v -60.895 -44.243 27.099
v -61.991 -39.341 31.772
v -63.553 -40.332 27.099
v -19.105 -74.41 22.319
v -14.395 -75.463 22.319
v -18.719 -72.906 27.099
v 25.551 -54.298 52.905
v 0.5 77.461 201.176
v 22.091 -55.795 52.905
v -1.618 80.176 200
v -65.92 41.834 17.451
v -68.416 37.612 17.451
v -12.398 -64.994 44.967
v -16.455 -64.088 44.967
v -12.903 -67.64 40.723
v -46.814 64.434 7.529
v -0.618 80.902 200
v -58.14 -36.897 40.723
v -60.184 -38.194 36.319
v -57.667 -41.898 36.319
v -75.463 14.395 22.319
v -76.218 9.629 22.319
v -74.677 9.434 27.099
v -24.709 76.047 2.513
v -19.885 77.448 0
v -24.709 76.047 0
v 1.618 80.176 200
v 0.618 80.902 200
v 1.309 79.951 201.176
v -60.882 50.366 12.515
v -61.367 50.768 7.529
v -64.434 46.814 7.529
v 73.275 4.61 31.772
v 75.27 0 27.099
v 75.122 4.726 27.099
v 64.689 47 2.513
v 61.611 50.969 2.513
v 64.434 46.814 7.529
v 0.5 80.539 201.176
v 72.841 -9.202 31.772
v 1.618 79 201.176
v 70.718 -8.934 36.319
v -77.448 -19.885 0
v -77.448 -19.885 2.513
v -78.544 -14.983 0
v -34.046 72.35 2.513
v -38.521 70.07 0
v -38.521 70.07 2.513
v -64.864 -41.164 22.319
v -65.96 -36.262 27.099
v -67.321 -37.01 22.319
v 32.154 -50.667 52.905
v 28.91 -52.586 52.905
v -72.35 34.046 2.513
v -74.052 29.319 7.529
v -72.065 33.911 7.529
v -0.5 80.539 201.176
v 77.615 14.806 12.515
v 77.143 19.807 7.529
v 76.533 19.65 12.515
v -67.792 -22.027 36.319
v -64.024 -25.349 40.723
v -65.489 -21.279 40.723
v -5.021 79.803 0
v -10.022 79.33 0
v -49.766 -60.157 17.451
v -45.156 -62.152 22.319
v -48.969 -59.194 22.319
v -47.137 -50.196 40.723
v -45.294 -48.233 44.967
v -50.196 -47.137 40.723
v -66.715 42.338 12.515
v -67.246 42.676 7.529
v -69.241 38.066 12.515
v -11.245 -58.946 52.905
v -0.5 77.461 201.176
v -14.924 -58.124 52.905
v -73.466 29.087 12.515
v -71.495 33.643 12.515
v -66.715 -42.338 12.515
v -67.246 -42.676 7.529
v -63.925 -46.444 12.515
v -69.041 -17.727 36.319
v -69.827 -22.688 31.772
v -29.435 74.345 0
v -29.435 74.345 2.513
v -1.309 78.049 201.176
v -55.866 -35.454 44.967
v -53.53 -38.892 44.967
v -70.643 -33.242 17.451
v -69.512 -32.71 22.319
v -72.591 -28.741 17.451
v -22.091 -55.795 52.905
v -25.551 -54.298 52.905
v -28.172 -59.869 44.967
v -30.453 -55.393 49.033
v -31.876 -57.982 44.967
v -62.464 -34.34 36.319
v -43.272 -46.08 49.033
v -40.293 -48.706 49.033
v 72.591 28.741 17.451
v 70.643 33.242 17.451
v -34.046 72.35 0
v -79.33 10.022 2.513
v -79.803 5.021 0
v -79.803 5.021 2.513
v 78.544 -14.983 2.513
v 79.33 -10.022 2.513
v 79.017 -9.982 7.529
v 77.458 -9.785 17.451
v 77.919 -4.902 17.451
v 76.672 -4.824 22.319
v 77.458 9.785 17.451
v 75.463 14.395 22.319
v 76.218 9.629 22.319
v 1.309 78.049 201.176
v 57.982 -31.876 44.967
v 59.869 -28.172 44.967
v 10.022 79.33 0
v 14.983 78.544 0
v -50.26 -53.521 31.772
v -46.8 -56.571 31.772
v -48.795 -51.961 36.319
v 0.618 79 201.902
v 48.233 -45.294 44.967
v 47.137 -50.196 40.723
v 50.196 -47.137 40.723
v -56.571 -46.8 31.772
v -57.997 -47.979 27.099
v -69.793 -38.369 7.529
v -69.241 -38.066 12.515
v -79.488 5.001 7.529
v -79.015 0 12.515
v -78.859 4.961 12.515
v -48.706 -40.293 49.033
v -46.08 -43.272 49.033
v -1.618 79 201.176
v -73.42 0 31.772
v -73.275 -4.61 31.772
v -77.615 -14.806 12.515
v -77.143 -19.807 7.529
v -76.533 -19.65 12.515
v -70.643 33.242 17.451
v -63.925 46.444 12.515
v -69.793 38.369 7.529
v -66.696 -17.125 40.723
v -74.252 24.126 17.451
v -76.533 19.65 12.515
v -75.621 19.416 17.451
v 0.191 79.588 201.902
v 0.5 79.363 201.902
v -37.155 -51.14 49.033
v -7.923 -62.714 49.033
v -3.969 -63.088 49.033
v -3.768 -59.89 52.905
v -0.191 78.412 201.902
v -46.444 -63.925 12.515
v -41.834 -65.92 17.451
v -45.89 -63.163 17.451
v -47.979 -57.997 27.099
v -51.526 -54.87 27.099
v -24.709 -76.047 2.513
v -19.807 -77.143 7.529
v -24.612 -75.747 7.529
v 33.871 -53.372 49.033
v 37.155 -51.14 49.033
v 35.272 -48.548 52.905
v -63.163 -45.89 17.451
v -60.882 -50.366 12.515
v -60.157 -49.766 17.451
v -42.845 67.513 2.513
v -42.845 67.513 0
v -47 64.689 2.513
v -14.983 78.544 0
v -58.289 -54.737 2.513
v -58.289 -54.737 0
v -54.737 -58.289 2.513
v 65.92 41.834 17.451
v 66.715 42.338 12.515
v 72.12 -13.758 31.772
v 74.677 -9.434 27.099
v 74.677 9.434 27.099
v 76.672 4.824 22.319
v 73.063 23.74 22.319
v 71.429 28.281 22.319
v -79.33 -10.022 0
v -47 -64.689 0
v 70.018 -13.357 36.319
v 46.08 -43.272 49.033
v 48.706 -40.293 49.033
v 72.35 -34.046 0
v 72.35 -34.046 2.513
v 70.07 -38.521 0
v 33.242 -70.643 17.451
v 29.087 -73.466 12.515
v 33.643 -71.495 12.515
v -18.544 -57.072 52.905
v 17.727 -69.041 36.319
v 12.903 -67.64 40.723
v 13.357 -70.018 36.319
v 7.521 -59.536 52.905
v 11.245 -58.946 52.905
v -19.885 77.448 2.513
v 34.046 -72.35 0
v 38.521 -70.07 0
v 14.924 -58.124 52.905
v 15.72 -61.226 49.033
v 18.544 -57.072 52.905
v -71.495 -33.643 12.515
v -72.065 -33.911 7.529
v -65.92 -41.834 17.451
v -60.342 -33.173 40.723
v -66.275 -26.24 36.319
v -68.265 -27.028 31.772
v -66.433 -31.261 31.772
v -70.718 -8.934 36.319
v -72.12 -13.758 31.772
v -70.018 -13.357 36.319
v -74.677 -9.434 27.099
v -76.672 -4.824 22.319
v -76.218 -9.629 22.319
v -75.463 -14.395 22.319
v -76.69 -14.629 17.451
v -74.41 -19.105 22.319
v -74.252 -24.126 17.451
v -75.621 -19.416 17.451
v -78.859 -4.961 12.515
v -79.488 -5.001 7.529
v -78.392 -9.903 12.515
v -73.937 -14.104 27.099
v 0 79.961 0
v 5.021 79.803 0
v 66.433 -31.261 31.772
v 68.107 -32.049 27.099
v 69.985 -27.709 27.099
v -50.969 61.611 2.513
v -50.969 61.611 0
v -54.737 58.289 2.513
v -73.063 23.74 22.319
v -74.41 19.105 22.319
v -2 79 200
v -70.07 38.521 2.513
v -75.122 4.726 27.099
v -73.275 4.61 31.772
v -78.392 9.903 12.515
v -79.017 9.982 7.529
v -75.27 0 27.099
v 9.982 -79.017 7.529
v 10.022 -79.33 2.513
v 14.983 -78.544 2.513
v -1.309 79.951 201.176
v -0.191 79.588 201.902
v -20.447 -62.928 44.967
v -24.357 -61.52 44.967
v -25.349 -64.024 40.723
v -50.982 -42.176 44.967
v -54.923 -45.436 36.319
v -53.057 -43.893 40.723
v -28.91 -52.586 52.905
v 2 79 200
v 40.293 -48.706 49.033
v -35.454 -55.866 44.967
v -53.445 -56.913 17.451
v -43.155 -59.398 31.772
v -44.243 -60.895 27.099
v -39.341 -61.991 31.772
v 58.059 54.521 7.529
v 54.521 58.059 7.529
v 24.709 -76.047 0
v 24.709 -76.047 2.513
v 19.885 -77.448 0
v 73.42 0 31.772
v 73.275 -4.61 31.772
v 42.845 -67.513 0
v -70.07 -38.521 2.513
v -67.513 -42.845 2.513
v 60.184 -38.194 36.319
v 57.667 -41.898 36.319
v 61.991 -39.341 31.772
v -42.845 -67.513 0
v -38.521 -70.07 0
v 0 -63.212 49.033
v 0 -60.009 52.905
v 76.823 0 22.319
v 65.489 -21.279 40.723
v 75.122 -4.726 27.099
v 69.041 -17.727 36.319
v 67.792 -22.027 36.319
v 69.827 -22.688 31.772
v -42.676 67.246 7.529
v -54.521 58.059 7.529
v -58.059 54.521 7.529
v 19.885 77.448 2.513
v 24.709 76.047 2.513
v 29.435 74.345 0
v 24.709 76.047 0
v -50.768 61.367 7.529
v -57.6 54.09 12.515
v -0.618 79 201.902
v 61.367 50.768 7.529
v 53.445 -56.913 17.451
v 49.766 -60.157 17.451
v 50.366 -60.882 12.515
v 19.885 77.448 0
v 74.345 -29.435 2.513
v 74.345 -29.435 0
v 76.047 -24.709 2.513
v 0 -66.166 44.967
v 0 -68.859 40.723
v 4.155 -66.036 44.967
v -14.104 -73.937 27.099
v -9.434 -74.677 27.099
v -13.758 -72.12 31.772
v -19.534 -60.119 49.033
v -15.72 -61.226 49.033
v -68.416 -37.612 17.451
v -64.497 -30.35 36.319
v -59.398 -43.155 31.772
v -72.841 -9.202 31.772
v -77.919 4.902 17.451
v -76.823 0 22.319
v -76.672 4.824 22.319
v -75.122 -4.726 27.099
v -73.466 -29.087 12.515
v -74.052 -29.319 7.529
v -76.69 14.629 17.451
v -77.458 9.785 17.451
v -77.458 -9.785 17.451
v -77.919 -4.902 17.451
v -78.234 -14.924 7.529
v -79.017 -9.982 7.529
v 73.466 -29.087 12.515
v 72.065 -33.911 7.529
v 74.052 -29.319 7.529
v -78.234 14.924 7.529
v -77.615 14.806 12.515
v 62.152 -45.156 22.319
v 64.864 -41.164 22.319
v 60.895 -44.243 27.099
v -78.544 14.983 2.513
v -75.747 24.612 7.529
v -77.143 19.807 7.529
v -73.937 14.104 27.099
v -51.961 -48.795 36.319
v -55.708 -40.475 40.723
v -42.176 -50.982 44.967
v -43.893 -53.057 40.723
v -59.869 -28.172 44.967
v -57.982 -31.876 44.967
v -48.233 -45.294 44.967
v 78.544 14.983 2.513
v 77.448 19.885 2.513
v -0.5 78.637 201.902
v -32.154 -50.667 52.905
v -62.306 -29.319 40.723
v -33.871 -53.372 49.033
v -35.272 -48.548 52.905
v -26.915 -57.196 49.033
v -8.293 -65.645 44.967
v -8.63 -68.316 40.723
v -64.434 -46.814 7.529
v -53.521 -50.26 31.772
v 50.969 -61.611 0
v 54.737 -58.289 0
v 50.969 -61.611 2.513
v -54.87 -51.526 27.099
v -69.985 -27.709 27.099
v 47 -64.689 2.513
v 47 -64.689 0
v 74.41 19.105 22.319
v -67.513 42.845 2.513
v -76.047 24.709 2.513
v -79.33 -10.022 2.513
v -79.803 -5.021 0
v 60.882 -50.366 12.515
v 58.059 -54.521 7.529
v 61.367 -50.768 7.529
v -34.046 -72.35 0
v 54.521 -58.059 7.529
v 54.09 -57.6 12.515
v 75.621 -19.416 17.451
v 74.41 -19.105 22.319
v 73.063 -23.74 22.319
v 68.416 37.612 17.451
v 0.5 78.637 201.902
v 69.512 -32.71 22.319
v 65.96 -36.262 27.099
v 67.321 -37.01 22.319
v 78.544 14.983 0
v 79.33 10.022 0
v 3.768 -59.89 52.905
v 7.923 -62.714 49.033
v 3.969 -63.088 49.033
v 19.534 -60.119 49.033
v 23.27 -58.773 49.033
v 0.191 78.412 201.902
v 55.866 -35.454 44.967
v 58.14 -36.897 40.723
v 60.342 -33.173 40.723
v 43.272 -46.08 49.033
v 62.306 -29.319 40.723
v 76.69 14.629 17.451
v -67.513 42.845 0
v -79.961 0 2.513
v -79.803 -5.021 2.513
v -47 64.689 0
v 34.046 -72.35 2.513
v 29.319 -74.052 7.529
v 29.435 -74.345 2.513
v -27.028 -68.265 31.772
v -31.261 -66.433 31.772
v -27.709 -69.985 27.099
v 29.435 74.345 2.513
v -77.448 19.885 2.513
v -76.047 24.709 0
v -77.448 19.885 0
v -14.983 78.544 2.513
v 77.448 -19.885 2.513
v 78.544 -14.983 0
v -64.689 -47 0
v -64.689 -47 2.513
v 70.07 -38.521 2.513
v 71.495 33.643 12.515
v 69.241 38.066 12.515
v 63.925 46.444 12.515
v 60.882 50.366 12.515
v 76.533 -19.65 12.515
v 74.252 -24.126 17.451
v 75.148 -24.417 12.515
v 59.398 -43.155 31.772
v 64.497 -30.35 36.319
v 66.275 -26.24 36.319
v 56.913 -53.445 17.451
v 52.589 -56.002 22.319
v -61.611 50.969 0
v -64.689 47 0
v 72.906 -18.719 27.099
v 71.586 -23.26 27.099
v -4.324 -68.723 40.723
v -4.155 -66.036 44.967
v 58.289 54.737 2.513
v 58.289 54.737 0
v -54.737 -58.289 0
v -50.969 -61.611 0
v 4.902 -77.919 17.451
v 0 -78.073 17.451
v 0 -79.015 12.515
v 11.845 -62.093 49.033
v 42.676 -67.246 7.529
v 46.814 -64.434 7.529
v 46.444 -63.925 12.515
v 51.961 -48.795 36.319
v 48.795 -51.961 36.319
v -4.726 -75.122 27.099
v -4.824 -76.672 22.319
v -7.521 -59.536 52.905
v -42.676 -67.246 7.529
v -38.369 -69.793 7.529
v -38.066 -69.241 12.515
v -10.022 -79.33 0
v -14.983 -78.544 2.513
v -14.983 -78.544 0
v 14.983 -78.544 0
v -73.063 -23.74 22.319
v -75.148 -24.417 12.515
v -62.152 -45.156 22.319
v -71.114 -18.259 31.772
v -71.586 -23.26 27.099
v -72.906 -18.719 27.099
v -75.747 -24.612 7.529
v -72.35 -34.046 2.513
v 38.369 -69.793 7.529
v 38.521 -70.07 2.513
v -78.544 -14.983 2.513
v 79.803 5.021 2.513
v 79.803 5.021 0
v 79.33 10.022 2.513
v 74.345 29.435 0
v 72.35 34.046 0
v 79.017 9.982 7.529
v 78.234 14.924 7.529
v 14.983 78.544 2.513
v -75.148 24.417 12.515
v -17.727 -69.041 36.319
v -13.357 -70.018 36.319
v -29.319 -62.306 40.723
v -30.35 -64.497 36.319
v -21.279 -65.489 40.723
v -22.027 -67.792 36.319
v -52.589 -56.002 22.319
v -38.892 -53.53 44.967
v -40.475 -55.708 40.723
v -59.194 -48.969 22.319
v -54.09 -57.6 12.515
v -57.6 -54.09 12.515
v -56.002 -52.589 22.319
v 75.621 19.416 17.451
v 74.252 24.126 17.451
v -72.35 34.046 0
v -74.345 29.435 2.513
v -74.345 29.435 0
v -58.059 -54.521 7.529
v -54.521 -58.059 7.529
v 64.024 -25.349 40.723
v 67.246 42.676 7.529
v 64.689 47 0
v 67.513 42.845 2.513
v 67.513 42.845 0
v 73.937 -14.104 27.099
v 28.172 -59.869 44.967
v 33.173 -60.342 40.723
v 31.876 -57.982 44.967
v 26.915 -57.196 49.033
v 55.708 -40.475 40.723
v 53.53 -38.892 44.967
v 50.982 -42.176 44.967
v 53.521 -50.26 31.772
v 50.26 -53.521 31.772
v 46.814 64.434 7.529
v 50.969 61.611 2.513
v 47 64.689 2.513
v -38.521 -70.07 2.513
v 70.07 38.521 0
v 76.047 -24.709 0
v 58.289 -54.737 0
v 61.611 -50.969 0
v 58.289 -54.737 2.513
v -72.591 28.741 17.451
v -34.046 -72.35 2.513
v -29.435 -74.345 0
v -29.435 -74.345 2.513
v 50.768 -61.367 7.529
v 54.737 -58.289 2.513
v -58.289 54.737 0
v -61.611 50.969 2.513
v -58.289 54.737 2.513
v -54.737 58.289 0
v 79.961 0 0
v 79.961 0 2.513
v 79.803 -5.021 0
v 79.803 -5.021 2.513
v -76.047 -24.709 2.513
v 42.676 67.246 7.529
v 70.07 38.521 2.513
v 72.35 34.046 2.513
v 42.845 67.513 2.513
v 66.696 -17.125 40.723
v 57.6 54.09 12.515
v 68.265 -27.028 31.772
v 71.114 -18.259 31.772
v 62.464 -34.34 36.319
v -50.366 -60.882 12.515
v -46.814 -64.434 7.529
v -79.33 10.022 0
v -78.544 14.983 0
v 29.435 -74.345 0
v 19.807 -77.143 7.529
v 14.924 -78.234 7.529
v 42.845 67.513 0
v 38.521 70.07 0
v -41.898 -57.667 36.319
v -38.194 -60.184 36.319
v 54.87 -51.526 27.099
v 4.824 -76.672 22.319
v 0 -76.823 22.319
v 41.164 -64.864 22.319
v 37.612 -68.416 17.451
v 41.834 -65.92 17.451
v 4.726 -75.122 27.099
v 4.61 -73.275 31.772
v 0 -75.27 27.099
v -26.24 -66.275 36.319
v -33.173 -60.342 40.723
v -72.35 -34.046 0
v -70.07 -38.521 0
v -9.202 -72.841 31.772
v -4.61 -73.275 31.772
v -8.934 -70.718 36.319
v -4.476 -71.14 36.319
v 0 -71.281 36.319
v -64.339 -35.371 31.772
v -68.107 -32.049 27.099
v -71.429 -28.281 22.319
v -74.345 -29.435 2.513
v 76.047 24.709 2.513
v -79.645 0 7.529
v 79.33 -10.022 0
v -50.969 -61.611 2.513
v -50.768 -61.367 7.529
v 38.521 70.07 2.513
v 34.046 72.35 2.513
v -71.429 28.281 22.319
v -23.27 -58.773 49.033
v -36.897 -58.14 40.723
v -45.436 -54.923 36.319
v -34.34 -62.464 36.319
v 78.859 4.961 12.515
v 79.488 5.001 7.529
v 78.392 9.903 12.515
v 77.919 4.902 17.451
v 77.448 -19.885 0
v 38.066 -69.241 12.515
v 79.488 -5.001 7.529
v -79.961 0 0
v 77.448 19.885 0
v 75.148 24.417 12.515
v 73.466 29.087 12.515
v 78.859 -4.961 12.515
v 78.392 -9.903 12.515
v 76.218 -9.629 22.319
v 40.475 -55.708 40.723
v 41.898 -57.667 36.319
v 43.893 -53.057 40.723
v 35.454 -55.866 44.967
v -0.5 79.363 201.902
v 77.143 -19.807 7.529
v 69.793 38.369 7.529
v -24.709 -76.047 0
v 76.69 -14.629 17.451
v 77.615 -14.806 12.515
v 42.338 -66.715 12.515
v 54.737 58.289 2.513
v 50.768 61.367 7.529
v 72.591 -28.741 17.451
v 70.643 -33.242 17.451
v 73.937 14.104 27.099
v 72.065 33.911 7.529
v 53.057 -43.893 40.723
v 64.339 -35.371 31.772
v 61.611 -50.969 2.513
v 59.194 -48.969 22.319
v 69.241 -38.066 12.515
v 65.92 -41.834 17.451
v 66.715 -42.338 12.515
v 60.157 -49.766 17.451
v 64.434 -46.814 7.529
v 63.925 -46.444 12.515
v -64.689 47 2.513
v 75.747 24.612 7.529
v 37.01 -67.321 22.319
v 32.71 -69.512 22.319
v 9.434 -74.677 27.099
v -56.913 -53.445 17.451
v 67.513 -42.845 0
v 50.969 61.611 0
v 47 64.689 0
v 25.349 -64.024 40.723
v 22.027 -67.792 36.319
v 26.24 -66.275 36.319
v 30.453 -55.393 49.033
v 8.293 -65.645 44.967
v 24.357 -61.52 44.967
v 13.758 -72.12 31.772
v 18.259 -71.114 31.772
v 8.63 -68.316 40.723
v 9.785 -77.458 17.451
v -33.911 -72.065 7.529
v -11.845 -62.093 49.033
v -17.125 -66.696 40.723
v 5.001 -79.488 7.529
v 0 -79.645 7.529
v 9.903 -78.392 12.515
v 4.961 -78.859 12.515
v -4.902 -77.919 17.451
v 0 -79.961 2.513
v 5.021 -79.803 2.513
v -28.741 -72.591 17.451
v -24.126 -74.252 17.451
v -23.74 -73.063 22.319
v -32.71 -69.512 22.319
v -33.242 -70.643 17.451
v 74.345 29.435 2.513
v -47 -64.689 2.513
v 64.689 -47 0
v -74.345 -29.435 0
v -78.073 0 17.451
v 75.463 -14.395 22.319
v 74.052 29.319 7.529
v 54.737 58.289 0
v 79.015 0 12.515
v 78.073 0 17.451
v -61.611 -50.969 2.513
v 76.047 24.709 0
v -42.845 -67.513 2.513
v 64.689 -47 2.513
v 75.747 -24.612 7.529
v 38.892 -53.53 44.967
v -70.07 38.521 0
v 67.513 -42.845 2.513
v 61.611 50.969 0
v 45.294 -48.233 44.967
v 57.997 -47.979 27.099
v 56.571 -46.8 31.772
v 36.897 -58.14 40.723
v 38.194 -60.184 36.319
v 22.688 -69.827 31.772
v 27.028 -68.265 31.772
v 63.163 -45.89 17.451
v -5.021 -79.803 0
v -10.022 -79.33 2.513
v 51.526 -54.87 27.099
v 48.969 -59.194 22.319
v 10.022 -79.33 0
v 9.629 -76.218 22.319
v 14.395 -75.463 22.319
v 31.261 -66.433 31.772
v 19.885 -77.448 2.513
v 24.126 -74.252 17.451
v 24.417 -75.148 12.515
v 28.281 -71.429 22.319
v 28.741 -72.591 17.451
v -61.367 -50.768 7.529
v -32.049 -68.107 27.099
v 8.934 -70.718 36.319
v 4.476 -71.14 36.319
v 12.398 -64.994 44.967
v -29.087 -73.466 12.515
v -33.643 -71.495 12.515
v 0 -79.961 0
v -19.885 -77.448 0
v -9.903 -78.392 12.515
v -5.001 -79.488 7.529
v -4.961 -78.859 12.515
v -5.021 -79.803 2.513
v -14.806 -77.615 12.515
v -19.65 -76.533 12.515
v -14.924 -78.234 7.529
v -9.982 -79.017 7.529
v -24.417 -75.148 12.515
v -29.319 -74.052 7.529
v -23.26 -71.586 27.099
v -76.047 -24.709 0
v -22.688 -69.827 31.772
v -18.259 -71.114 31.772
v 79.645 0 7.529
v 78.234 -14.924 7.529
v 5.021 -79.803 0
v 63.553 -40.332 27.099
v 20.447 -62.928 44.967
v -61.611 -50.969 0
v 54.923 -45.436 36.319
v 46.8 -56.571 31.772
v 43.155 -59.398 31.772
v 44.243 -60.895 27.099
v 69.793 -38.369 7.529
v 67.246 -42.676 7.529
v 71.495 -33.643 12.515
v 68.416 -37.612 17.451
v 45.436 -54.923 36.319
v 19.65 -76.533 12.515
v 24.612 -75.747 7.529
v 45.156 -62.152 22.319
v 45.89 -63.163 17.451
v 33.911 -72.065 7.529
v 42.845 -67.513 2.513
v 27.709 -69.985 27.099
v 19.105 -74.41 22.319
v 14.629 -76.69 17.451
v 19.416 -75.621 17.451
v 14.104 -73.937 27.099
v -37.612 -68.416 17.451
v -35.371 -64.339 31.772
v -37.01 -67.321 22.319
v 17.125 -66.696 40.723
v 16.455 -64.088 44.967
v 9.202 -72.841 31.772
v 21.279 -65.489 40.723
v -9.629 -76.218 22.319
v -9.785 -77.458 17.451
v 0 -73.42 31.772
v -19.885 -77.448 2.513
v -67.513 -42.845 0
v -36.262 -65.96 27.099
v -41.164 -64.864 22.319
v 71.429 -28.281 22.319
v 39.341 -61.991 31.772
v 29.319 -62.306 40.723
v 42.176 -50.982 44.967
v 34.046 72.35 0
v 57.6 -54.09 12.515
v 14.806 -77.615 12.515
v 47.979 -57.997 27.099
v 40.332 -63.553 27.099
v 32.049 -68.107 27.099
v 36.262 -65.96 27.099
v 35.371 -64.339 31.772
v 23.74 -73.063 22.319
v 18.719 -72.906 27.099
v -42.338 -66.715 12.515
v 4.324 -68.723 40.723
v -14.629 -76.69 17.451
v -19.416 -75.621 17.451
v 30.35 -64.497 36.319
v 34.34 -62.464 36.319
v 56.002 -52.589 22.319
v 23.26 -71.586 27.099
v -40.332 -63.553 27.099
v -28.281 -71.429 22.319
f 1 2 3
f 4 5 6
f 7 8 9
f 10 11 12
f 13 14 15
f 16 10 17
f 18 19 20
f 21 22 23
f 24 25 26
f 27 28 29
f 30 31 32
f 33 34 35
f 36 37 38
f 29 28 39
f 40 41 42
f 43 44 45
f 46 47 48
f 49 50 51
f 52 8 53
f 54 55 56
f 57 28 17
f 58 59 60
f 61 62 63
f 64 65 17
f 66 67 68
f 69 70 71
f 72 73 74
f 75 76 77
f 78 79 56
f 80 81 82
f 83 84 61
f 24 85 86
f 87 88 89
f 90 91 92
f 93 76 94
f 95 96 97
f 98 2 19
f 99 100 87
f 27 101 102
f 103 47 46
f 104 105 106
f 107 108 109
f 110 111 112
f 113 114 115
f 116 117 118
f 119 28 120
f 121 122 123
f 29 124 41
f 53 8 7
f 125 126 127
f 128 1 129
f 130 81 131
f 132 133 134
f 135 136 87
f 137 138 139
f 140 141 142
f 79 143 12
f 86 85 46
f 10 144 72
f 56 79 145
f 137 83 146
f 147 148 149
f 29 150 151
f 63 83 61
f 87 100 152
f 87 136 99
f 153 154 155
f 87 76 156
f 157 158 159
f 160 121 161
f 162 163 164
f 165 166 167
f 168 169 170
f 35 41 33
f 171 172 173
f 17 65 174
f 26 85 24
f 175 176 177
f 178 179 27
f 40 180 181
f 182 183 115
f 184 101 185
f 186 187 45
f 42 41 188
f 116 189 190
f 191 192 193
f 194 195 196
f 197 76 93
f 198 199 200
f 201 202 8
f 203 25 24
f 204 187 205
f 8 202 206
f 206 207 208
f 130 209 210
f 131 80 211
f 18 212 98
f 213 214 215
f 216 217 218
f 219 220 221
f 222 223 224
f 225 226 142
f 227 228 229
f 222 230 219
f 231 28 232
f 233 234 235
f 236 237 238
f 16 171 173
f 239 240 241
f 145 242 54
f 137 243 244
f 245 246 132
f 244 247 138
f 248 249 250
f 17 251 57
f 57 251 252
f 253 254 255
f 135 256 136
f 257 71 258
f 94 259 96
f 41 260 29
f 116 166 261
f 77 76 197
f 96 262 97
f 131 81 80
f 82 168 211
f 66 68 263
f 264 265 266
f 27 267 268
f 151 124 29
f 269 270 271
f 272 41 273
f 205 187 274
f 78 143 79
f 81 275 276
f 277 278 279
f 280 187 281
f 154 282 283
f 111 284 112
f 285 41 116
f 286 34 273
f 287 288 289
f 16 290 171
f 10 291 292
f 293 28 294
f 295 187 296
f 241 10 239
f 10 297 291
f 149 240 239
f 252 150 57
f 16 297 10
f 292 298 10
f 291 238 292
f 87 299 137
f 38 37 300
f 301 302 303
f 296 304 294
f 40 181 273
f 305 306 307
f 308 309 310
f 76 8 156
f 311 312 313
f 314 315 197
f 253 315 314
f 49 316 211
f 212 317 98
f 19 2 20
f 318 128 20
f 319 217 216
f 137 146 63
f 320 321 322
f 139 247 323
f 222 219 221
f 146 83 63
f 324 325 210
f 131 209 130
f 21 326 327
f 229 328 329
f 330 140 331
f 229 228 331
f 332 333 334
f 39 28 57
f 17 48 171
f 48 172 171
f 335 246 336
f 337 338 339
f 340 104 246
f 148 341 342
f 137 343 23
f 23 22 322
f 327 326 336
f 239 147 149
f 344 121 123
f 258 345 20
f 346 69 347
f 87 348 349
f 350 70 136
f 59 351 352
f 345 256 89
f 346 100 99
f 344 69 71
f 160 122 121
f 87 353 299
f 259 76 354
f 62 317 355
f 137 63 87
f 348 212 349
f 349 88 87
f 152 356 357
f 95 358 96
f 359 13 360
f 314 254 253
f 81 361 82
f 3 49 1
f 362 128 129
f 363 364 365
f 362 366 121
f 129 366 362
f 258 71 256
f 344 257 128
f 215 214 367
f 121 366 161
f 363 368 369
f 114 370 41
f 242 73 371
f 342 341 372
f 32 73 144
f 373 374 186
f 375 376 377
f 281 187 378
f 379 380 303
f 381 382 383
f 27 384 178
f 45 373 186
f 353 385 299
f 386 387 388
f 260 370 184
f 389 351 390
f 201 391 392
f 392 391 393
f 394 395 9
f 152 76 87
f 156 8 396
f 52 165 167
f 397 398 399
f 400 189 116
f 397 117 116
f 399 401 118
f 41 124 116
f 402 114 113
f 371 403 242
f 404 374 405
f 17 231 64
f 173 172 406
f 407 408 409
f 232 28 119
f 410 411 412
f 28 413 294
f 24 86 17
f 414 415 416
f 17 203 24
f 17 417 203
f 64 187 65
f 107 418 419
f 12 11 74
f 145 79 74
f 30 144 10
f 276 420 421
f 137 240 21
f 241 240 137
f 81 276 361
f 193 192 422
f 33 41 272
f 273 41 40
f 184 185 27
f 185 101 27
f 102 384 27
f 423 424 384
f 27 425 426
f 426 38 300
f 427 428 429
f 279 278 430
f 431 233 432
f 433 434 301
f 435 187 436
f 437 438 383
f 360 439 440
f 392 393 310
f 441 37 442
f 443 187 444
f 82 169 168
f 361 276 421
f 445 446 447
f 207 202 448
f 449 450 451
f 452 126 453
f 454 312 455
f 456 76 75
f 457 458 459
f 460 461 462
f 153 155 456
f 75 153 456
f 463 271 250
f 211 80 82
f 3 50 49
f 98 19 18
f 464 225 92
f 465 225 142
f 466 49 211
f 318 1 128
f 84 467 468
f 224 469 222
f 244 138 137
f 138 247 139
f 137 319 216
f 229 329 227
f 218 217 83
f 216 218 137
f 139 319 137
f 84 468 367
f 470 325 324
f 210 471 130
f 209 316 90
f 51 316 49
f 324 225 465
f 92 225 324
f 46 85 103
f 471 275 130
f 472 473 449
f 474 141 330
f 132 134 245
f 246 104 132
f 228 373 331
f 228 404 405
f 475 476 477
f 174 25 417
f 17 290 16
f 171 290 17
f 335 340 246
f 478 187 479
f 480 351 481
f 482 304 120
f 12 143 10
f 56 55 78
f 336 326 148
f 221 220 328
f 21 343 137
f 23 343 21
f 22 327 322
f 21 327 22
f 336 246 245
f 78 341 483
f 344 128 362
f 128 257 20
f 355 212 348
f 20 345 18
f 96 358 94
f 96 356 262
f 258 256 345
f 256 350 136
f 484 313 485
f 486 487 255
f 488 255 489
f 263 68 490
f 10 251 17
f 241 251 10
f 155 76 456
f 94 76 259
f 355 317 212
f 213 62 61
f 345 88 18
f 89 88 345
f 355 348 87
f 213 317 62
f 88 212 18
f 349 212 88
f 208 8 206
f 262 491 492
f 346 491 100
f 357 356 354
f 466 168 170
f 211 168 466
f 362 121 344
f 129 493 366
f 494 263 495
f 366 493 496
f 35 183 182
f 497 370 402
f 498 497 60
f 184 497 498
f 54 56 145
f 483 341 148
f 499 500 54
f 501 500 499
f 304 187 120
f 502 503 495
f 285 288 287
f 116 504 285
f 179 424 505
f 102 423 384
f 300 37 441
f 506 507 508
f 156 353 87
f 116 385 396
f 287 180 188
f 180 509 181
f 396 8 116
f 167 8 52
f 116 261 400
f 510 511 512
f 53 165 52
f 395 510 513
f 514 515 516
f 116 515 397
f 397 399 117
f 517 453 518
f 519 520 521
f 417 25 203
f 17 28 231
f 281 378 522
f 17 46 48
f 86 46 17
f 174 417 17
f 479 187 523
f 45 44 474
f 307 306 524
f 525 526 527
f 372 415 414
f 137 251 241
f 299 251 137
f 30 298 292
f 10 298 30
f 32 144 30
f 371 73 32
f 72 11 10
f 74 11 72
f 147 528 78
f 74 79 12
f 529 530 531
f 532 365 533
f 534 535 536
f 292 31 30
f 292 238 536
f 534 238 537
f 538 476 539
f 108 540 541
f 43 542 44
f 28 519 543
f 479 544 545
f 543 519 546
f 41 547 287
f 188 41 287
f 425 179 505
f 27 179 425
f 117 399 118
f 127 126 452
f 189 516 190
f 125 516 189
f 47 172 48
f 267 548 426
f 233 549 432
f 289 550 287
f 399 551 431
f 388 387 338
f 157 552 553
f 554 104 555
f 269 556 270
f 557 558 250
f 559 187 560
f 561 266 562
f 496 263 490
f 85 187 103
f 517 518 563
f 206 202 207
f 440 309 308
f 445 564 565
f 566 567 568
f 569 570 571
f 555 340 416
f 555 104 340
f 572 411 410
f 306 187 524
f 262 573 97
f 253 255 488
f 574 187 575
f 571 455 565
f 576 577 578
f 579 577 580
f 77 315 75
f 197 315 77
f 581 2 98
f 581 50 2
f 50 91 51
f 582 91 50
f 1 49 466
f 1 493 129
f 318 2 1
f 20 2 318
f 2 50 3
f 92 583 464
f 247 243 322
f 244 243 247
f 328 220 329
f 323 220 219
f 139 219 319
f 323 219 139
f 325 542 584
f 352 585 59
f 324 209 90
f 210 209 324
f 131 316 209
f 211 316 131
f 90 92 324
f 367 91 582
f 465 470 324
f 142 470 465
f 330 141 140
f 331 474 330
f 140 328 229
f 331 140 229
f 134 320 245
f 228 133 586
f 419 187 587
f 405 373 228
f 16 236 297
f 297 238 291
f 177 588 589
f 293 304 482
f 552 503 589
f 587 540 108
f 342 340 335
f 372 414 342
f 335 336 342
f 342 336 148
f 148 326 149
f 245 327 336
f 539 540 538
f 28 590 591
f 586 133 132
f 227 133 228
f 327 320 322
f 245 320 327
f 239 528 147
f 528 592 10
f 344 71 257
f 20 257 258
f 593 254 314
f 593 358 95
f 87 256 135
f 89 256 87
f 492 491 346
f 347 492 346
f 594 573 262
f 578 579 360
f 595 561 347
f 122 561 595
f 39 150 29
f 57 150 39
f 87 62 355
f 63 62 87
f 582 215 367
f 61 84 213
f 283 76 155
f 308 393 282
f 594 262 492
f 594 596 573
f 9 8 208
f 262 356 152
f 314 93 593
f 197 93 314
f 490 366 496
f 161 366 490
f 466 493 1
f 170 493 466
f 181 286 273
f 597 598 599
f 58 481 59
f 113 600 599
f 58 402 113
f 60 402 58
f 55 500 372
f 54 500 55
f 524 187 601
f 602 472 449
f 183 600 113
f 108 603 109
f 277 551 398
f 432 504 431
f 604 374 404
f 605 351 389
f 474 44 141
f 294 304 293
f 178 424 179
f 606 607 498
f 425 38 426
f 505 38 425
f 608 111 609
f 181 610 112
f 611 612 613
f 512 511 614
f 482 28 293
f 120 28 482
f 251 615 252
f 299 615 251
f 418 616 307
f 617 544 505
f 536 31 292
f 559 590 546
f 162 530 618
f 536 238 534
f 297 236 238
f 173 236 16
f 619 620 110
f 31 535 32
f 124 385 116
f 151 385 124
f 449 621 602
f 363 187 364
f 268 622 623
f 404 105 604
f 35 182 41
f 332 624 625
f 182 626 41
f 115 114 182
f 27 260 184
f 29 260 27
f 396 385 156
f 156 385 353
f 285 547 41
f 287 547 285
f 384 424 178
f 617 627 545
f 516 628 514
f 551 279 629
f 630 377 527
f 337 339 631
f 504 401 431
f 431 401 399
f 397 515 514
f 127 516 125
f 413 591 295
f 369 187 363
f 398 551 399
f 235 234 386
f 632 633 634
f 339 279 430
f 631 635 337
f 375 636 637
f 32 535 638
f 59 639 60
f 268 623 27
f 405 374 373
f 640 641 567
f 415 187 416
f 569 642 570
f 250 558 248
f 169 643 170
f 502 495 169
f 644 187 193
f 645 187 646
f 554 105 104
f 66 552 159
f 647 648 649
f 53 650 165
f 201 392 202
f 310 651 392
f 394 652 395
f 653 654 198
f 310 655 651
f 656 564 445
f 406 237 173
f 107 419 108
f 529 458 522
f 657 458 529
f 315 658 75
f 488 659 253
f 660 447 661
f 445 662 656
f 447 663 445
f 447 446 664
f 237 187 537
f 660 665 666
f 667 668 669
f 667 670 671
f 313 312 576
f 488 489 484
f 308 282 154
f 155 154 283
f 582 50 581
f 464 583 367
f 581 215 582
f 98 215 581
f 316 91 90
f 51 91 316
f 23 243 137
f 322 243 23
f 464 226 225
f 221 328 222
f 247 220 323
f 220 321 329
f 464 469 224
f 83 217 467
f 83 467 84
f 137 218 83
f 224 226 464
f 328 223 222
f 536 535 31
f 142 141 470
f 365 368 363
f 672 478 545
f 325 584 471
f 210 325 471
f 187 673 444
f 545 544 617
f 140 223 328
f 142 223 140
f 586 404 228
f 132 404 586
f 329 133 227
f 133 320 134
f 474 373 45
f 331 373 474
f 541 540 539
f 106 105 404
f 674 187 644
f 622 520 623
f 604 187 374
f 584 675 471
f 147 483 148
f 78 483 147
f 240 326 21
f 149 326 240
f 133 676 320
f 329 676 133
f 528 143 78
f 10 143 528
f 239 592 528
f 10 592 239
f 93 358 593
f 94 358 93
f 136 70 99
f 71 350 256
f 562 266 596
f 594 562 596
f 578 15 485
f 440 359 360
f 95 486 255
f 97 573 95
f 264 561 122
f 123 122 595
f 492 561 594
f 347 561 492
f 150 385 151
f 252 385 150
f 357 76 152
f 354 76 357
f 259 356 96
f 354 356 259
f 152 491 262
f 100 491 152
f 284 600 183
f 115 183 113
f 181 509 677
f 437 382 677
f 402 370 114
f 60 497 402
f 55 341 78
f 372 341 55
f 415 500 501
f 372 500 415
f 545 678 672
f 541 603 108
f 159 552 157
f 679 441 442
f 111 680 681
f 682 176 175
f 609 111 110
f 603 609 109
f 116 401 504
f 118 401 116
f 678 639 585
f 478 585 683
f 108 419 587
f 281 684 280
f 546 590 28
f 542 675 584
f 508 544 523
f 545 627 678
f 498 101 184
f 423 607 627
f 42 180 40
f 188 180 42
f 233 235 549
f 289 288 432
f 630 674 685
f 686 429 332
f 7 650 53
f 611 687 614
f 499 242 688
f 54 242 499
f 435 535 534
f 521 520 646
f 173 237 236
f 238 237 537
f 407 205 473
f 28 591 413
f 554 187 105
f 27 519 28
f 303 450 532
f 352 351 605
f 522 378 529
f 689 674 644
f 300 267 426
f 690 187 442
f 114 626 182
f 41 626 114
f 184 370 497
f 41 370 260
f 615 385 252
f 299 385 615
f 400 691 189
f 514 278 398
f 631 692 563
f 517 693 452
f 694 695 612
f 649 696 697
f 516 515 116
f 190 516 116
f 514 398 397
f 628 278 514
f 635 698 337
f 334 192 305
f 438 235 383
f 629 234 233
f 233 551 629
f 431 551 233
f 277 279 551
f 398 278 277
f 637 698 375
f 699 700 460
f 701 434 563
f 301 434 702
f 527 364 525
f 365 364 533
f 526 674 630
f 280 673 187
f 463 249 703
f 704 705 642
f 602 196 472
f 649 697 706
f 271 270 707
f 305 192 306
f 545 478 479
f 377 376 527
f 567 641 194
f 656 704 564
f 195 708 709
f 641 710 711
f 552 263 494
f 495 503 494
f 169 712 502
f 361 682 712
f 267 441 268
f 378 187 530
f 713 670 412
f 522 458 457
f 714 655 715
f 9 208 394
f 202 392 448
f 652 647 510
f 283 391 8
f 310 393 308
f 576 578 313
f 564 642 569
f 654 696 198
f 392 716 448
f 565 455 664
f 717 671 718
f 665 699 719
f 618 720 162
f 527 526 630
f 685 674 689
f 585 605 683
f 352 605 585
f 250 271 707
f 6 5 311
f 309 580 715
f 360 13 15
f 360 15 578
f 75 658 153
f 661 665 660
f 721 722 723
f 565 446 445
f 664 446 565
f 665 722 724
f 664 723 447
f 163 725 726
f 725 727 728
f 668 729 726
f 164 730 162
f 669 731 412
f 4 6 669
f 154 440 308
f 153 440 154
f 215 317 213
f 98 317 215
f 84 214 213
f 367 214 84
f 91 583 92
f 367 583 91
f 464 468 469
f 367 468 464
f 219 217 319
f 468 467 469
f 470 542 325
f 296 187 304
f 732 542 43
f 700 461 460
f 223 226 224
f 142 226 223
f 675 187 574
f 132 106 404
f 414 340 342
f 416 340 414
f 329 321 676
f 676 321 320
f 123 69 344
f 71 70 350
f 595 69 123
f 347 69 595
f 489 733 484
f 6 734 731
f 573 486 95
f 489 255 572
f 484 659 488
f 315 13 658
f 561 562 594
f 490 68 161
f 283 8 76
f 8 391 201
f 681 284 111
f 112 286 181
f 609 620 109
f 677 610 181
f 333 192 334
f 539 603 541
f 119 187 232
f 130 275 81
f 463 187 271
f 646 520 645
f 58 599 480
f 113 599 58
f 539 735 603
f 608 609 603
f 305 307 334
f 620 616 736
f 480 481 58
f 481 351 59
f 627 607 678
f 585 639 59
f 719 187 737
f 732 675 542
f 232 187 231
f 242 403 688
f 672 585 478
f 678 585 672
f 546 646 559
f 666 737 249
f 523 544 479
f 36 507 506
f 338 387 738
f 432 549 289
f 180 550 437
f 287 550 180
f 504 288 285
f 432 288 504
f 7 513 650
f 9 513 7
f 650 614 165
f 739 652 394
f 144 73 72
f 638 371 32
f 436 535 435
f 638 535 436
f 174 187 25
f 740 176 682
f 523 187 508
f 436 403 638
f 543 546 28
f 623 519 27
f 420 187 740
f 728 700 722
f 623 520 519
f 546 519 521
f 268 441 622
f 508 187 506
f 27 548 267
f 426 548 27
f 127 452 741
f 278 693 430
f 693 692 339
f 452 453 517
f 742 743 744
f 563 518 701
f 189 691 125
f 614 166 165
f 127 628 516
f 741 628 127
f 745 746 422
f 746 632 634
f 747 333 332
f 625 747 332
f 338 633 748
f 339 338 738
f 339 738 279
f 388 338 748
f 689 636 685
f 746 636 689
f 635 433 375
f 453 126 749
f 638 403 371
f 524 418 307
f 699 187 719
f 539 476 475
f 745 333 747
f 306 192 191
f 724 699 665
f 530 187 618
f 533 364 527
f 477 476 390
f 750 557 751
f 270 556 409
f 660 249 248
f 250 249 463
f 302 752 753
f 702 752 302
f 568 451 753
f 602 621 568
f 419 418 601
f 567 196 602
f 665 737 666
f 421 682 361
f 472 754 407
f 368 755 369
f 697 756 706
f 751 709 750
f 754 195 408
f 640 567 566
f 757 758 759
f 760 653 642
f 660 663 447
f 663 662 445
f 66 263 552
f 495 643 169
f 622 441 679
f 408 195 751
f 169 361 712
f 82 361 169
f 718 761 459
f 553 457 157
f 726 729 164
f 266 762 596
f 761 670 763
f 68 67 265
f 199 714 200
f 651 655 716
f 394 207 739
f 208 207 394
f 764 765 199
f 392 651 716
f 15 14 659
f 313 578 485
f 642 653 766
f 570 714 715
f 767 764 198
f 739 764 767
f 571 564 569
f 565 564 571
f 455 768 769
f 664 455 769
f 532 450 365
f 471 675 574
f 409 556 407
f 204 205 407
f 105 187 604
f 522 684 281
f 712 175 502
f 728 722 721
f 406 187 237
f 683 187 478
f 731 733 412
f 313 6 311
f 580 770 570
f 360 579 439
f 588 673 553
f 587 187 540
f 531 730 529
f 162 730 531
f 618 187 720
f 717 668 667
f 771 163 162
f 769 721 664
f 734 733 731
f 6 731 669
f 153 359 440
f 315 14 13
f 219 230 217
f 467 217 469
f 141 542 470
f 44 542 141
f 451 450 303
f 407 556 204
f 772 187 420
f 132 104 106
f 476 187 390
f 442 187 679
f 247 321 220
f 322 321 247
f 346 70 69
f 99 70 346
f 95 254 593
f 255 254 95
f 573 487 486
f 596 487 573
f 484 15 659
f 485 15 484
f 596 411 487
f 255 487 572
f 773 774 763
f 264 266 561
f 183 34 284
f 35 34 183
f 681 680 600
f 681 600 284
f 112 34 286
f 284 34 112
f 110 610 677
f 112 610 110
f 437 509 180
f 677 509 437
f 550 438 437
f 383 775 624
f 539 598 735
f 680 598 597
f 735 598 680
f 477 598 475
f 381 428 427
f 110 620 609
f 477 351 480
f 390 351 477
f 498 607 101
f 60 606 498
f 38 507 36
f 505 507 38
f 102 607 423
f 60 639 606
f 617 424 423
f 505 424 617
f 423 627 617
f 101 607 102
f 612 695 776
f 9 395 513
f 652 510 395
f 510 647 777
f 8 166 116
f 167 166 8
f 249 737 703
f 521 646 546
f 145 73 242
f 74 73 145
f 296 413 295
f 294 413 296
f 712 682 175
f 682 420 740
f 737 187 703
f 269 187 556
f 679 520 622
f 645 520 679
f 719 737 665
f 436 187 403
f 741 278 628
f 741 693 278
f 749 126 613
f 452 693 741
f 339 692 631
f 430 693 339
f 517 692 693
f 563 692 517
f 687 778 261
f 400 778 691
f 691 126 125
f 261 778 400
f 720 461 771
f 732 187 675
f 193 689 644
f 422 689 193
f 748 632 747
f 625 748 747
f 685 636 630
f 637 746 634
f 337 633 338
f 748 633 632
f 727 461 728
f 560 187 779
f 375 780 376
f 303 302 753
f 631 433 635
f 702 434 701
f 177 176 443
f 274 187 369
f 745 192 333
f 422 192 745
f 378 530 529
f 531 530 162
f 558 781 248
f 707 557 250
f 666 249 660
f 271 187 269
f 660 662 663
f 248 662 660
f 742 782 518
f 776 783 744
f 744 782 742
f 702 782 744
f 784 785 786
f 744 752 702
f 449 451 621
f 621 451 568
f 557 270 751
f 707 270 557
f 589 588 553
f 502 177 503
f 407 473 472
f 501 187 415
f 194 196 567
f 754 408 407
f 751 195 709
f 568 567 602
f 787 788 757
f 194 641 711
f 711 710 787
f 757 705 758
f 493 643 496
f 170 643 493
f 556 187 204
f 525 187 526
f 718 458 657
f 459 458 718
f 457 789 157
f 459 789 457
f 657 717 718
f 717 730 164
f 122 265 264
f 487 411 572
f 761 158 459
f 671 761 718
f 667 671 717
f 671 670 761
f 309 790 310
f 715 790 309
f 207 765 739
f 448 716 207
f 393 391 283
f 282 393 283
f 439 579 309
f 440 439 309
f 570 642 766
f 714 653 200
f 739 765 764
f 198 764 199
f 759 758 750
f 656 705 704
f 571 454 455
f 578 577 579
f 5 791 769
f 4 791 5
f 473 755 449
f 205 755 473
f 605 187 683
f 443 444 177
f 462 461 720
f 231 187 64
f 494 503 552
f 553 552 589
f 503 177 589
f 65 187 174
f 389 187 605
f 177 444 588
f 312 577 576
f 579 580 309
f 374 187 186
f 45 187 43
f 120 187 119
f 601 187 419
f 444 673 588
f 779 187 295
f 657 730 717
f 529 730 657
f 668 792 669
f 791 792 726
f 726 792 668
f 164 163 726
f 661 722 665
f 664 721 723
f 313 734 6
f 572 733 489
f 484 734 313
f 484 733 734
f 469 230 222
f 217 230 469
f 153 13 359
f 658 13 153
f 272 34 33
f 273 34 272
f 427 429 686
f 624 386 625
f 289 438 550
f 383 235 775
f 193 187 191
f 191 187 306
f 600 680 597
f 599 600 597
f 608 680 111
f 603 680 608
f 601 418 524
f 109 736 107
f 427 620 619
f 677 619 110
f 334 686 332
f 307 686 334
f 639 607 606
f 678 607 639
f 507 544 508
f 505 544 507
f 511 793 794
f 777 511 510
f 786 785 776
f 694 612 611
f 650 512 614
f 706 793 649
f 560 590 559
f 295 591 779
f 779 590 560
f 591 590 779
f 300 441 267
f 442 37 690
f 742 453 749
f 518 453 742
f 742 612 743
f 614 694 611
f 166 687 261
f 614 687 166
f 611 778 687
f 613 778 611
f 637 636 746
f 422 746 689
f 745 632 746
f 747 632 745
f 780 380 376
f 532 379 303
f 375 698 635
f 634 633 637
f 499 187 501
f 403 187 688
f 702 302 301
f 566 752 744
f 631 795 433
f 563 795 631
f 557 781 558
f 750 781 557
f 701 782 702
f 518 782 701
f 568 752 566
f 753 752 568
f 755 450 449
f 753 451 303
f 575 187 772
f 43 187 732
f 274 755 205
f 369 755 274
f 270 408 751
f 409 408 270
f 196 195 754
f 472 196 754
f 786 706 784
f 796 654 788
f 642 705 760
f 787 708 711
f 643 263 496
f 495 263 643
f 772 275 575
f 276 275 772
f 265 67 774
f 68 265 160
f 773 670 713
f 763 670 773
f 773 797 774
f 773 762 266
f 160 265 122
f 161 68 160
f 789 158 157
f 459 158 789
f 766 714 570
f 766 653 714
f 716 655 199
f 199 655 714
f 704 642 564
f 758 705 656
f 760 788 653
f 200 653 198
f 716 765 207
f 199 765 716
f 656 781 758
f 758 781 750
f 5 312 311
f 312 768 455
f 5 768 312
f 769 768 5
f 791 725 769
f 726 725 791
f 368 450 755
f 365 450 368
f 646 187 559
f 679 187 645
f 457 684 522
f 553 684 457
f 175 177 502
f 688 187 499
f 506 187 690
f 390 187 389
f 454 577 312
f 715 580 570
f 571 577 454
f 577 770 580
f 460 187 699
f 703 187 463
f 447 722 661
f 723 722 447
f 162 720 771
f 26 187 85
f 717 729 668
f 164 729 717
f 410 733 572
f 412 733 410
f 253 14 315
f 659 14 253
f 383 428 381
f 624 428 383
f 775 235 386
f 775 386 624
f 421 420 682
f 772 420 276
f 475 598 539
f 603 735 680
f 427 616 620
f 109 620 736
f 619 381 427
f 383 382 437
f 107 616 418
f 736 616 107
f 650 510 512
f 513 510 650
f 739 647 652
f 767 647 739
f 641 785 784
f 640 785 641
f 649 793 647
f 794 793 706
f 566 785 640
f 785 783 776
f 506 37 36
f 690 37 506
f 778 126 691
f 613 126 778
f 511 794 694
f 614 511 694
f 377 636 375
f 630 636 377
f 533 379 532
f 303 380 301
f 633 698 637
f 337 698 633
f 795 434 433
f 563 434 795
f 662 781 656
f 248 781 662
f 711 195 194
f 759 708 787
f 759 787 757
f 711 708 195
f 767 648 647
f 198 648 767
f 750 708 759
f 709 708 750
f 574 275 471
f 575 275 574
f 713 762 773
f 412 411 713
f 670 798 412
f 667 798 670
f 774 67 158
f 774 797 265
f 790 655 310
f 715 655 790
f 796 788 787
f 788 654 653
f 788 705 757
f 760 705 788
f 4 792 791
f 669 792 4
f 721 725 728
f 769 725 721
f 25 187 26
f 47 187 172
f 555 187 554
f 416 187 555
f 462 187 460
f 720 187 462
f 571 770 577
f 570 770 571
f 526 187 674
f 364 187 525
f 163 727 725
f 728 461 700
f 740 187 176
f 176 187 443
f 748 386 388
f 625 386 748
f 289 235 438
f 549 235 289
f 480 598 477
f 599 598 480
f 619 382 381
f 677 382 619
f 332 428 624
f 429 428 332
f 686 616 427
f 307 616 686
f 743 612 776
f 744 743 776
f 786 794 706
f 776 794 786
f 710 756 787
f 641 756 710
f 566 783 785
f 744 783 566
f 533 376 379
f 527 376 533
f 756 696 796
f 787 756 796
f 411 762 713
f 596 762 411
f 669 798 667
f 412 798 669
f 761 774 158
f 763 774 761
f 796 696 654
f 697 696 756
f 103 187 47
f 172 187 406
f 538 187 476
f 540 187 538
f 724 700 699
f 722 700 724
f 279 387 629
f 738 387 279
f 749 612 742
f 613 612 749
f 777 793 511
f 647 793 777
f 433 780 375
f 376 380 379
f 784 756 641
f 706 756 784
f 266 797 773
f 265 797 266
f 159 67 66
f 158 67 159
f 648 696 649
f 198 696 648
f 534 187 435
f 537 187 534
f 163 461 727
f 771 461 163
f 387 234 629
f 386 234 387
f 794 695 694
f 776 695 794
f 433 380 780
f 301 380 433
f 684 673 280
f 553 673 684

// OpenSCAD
d = 160;
$fn = 100;

h = 200;
hull() {
	difference() {
		sphere(d/2);
		translate([-d, -d, -2*d]) cube([2*d, 2*d, 2*d]);
	}
	translate([0, d/2 - 1, h]) sphere(2, $fn = 10);
}
